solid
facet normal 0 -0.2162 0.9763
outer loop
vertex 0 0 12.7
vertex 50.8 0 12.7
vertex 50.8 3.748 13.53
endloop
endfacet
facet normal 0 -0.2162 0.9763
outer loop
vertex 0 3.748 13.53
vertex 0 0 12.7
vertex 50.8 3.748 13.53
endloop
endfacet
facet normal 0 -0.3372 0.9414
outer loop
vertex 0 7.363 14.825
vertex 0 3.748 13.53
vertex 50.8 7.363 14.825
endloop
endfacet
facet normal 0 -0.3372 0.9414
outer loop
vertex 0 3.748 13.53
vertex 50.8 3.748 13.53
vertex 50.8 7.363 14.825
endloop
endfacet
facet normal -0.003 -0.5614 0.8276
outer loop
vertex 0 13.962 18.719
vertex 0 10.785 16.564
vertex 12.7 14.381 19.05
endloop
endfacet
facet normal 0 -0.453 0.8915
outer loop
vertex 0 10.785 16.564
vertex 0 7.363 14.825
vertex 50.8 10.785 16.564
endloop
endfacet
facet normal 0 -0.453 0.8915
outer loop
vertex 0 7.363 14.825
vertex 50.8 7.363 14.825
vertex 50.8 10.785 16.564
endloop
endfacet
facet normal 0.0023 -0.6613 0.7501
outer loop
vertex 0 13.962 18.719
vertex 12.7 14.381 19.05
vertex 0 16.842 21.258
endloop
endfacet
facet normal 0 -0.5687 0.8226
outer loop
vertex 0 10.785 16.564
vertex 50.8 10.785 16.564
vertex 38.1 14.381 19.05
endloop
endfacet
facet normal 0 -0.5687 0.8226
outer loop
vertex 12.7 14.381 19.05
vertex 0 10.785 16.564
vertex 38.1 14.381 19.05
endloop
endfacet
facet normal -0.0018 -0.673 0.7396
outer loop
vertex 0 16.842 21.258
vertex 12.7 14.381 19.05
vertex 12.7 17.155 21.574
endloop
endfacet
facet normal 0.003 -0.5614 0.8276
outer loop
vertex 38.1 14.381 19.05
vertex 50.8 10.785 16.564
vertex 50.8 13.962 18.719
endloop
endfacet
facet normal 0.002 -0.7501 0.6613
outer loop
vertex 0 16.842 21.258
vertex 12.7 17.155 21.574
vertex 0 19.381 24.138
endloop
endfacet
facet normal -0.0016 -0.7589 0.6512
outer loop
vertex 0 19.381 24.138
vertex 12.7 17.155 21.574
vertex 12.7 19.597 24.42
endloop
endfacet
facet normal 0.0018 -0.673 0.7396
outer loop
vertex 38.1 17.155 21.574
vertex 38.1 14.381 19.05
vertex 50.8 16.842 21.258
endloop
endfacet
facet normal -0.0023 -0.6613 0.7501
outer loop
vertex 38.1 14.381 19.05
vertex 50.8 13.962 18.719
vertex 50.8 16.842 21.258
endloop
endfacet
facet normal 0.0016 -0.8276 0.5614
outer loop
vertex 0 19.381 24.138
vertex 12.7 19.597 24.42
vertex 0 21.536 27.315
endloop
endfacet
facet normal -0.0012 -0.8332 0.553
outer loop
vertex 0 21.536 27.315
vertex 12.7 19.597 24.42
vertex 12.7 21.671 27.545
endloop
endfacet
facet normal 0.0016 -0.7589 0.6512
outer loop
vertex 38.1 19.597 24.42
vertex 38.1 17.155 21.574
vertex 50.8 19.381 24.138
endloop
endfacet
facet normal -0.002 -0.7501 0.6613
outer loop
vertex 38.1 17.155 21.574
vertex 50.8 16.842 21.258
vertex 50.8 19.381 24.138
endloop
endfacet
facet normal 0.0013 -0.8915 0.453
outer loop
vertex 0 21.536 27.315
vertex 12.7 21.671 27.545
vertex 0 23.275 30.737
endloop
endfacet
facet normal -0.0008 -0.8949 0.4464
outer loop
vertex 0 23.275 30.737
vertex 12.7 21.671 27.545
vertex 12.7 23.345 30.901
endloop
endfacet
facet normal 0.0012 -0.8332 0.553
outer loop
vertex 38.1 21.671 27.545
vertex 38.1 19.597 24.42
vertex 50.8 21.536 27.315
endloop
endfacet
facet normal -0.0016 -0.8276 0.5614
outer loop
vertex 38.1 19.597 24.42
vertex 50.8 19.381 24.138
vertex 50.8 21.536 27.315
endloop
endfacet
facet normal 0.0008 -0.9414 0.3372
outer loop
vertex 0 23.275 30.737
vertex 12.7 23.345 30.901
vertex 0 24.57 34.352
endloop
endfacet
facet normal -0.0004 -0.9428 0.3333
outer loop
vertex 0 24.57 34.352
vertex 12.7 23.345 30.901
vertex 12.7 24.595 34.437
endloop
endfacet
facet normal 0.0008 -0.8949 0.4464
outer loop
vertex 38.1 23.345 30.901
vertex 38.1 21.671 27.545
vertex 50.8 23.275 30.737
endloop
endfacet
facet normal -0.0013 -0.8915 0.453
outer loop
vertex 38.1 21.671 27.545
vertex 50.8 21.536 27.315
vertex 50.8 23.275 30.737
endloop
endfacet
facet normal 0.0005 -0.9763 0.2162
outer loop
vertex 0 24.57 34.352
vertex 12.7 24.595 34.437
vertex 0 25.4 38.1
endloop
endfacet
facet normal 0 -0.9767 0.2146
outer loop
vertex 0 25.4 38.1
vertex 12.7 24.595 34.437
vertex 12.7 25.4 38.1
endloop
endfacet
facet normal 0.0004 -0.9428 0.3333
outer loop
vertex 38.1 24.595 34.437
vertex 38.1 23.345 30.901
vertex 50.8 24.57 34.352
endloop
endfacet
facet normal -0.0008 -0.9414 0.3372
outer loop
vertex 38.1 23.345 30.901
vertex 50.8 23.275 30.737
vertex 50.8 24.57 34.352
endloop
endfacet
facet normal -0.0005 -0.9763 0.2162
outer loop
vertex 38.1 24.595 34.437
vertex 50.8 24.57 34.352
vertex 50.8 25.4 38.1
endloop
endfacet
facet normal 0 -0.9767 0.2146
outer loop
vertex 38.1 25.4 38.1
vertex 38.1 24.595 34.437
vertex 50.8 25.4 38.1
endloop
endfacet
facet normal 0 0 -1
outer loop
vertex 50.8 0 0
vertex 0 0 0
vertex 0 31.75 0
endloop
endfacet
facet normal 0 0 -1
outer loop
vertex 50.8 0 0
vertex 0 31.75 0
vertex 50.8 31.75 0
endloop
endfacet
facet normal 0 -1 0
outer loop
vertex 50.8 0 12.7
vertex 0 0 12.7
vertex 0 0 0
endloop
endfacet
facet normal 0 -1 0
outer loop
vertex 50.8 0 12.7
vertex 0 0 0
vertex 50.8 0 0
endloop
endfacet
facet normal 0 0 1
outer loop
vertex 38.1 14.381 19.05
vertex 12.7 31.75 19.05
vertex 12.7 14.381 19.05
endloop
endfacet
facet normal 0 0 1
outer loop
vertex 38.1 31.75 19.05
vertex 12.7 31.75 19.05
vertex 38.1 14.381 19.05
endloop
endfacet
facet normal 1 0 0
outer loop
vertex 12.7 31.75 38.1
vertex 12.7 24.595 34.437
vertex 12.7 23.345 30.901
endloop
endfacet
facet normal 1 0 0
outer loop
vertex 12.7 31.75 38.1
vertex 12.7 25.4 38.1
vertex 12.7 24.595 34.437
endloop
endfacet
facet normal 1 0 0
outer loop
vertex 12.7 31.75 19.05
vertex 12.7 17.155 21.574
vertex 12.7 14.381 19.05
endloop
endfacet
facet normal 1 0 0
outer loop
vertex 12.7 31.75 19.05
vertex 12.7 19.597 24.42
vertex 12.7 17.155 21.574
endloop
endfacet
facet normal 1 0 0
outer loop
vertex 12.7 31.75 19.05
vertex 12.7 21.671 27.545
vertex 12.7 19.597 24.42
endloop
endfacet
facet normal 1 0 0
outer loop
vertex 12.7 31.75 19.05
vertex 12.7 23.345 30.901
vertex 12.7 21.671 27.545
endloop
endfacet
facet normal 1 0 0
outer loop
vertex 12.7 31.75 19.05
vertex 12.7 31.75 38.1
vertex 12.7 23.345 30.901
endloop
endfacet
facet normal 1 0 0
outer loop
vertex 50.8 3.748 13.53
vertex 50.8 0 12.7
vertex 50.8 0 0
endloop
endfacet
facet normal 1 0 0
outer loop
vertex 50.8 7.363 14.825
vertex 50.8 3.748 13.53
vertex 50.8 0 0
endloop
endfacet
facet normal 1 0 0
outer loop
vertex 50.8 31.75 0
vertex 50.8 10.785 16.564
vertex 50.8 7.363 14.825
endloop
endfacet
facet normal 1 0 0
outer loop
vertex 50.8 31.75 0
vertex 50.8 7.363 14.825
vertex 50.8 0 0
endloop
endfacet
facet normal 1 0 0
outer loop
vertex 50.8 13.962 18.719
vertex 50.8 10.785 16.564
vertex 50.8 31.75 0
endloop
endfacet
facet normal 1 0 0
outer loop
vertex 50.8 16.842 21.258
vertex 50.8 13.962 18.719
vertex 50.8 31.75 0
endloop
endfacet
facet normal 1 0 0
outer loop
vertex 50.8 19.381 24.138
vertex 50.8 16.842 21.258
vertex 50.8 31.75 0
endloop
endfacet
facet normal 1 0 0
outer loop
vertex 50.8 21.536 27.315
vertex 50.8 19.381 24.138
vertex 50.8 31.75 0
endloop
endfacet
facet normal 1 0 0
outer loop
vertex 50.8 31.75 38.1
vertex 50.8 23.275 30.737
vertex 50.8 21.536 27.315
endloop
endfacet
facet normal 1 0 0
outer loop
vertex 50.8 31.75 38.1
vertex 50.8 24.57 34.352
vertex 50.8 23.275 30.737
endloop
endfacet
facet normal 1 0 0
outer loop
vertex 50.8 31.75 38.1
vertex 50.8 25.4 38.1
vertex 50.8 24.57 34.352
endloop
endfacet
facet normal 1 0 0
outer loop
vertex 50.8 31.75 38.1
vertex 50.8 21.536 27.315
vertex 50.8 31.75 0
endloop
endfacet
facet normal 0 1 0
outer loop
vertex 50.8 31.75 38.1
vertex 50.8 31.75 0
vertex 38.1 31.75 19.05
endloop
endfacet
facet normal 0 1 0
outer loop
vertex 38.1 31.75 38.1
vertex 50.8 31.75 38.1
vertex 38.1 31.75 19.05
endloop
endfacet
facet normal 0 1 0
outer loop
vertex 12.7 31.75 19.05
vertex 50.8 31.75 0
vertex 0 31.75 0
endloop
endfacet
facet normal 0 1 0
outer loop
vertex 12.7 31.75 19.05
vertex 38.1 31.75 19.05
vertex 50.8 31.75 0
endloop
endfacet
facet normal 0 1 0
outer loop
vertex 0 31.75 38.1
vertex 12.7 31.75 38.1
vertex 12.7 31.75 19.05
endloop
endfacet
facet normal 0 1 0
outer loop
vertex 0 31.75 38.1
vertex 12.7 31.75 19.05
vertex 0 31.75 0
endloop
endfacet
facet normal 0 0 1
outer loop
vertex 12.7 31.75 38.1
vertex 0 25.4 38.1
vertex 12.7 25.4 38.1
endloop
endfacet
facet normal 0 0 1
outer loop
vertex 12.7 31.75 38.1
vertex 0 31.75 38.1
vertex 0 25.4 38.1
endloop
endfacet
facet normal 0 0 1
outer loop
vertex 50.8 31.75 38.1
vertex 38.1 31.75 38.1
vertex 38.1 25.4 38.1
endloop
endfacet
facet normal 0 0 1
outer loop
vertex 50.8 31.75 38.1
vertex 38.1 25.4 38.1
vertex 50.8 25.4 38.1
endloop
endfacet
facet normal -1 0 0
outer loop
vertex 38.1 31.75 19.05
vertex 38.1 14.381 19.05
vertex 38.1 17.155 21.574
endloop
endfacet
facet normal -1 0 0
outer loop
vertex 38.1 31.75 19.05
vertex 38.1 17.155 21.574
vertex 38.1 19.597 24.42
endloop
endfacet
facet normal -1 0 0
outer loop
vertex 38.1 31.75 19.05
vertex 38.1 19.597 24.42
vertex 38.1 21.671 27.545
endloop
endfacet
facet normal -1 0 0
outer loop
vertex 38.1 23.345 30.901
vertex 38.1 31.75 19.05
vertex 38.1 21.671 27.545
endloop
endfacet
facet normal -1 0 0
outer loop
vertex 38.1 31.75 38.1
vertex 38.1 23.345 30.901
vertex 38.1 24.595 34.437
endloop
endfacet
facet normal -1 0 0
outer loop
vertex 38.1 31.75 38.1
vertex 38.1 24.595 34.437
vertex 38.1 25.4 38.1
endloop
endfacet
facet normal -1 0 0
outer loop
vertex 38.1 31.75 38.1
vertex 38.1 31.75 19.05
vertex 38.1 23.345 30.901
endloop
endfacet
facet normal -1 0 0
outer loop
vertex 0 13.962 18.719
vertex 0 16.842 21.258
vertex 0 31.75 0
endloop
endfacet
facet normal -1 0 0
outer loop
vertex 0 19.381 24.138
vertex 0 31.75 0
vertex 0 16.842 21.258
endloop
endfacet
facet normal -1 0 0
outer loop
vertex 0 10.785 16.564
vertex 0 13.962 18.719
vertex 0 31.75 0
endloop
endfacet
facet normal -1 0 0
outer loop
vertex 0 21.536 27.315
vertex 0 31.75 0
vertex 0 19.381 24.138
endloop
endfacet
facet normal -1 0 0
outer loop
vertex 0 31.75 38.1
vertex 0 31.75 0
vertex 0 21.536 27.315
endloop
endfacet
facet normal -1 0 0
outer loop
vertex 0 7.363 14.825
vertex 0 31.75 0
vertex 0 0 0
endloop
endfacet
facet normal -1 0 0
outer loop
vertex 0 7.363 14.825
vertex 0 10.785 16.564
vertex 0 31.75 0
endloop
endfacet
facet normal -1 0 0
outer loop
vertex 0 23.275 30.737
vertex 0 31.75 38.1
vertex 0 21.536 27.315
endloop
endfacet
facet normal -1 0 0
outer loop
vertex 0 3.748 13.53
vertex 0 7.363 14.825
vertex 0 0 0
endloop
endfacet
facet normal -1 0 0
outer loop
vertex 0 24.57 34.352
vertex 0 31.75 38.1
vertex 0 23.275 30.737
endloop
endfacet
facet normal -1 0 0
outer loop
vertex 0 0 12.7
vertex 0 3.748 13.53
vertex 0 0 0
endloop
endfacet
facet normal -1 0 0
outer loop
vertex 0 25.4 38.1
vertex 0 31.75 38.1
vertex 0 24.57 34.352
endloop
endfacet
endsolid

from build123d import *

# Parameters (mm, degrees)
F0_W     = 50.8
F0_H     = 12.7
F1_DEPTH = 31.75
F3_DEPTH = 6.35
F5_DEPTH = 25.4
F7_DEPTH = 50.8
F8_DEPTH = 25.4


with BuildPart() as f1:
    # F0 (on Front) → F1 (new body)
    with BuildSketch(Plane.XZ):
        with Locations((25.4, 6.35)):
            Rectangle(F0_W, F0_H)
    extrude(amount=-F1_DEPTH)

    # F2 (on face) → F3 (join)
    with BuildSketch(Plane(origin=(0, 31.75, 0), x_dir=(-1, 0, 0), z_dir=(0, 1, 0))):
        Polygon((-50.8, 38.1), (-50.8, 12.7), (0, 12.7), (0, 38.1), (-12.7, 38.1), (-12.7, 19.05), (-38.1, 19.05), (-38.1, 38.1), align=None)
    extrude(amount=-F3_DEPTH)

    # F4 (on face) → F5 (join)
    with BuildSketch(Plane.XY.offset(38.1)):
        Polygon((50.8, 0), (50.8, 25.4), (38.1, 25.4), (0, 25.4), (0, 0), align=None)
    extrude(amount=-F5_DEPTH)

    # F6 (on face) → F7 (cut)
    with BuildSketch(Plane.YZ.offset(50.8)):
        with BuildLine():
            Line((0, 38.1), (0, 12.7))
            ThreePointArc((0, 12.7), (16.8424565007, 21.2575434993), (25.4, 38.1))
            Line((25.4, 38.1), (0, 38.1))
        make_face()
    extrude(amount=-F7_DEPTH, mode=Mode.SUBTRACT)

    # F8 (cut): a face of the model
    f8_faces = [f1.faces().sort_by_distance(p)[0] for p in [
        (25.4, 25.4, 28.575),
    ]]
    extrude(f8_faces, amount=-F8_DEPTH, mode=Mode.SUBTRACT)


solid = f1.part
